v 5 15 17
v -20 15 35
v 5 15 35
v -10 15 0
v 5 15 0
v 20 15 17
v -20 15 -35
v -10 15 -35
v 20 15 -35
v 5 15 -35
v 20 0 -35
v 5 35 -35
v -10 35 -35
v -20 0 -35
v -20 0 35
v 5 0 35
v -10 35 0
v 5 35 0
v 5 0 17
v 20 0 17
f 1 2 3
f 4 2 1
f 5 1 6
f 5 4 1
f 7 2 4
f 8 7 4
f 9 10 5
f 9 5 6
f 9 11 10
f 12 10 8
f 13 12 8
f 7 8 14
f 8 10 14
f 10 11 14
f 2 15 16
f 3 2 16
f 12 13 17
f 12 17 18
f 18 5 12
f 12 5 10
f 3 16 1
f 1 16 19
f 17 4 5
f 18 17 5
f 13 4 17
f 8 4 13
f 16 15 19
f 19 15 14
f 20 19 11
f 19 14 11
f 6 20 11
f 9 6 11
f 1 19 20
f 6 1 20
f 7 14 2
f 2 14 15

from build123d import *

# Parameters (mm, degrees)
Y_KSEKLIK_EKSTR_ZYON1_DEPTH = 15
IZIM2_W                     = 15
IZIM2_H                     = 35
Y_KSEKLIK_EKSTR_ZYON2_DEPTH = 20


with BuildPart() as part:
    # Çizim1 → Yükseklik-Ekstrüzyon1 (new body)
    with BuildSketch(Plane(origin=(0, 0, 0), x_dir=(1, 0, 0), z_dir=(0, 1, 0))):
        Polygon((5, -35), (5, -17), (20, -17), (20, 35), (-20, 35), (-20, -35), align=None)
    extrude(amount=Y_KSEKLIK_EKSTR_ZYON1_DEPTH)

    # Çizim2 → Yükseklik-Ekstrüzyon2 (add)
    with BuildSketch(Plane(origin=(0, 15, 0), x_dir=(1, 0, 0), z_dir=(0, 1, 0))):
        with Locations((-2.5, 17.5)):
            Rectangle(IZIM2_W, IZIM2_H)
    extrude(amount=Y_KSEKLIK_EKSTR_ZYON2_DEPTH)


solid = part.part
